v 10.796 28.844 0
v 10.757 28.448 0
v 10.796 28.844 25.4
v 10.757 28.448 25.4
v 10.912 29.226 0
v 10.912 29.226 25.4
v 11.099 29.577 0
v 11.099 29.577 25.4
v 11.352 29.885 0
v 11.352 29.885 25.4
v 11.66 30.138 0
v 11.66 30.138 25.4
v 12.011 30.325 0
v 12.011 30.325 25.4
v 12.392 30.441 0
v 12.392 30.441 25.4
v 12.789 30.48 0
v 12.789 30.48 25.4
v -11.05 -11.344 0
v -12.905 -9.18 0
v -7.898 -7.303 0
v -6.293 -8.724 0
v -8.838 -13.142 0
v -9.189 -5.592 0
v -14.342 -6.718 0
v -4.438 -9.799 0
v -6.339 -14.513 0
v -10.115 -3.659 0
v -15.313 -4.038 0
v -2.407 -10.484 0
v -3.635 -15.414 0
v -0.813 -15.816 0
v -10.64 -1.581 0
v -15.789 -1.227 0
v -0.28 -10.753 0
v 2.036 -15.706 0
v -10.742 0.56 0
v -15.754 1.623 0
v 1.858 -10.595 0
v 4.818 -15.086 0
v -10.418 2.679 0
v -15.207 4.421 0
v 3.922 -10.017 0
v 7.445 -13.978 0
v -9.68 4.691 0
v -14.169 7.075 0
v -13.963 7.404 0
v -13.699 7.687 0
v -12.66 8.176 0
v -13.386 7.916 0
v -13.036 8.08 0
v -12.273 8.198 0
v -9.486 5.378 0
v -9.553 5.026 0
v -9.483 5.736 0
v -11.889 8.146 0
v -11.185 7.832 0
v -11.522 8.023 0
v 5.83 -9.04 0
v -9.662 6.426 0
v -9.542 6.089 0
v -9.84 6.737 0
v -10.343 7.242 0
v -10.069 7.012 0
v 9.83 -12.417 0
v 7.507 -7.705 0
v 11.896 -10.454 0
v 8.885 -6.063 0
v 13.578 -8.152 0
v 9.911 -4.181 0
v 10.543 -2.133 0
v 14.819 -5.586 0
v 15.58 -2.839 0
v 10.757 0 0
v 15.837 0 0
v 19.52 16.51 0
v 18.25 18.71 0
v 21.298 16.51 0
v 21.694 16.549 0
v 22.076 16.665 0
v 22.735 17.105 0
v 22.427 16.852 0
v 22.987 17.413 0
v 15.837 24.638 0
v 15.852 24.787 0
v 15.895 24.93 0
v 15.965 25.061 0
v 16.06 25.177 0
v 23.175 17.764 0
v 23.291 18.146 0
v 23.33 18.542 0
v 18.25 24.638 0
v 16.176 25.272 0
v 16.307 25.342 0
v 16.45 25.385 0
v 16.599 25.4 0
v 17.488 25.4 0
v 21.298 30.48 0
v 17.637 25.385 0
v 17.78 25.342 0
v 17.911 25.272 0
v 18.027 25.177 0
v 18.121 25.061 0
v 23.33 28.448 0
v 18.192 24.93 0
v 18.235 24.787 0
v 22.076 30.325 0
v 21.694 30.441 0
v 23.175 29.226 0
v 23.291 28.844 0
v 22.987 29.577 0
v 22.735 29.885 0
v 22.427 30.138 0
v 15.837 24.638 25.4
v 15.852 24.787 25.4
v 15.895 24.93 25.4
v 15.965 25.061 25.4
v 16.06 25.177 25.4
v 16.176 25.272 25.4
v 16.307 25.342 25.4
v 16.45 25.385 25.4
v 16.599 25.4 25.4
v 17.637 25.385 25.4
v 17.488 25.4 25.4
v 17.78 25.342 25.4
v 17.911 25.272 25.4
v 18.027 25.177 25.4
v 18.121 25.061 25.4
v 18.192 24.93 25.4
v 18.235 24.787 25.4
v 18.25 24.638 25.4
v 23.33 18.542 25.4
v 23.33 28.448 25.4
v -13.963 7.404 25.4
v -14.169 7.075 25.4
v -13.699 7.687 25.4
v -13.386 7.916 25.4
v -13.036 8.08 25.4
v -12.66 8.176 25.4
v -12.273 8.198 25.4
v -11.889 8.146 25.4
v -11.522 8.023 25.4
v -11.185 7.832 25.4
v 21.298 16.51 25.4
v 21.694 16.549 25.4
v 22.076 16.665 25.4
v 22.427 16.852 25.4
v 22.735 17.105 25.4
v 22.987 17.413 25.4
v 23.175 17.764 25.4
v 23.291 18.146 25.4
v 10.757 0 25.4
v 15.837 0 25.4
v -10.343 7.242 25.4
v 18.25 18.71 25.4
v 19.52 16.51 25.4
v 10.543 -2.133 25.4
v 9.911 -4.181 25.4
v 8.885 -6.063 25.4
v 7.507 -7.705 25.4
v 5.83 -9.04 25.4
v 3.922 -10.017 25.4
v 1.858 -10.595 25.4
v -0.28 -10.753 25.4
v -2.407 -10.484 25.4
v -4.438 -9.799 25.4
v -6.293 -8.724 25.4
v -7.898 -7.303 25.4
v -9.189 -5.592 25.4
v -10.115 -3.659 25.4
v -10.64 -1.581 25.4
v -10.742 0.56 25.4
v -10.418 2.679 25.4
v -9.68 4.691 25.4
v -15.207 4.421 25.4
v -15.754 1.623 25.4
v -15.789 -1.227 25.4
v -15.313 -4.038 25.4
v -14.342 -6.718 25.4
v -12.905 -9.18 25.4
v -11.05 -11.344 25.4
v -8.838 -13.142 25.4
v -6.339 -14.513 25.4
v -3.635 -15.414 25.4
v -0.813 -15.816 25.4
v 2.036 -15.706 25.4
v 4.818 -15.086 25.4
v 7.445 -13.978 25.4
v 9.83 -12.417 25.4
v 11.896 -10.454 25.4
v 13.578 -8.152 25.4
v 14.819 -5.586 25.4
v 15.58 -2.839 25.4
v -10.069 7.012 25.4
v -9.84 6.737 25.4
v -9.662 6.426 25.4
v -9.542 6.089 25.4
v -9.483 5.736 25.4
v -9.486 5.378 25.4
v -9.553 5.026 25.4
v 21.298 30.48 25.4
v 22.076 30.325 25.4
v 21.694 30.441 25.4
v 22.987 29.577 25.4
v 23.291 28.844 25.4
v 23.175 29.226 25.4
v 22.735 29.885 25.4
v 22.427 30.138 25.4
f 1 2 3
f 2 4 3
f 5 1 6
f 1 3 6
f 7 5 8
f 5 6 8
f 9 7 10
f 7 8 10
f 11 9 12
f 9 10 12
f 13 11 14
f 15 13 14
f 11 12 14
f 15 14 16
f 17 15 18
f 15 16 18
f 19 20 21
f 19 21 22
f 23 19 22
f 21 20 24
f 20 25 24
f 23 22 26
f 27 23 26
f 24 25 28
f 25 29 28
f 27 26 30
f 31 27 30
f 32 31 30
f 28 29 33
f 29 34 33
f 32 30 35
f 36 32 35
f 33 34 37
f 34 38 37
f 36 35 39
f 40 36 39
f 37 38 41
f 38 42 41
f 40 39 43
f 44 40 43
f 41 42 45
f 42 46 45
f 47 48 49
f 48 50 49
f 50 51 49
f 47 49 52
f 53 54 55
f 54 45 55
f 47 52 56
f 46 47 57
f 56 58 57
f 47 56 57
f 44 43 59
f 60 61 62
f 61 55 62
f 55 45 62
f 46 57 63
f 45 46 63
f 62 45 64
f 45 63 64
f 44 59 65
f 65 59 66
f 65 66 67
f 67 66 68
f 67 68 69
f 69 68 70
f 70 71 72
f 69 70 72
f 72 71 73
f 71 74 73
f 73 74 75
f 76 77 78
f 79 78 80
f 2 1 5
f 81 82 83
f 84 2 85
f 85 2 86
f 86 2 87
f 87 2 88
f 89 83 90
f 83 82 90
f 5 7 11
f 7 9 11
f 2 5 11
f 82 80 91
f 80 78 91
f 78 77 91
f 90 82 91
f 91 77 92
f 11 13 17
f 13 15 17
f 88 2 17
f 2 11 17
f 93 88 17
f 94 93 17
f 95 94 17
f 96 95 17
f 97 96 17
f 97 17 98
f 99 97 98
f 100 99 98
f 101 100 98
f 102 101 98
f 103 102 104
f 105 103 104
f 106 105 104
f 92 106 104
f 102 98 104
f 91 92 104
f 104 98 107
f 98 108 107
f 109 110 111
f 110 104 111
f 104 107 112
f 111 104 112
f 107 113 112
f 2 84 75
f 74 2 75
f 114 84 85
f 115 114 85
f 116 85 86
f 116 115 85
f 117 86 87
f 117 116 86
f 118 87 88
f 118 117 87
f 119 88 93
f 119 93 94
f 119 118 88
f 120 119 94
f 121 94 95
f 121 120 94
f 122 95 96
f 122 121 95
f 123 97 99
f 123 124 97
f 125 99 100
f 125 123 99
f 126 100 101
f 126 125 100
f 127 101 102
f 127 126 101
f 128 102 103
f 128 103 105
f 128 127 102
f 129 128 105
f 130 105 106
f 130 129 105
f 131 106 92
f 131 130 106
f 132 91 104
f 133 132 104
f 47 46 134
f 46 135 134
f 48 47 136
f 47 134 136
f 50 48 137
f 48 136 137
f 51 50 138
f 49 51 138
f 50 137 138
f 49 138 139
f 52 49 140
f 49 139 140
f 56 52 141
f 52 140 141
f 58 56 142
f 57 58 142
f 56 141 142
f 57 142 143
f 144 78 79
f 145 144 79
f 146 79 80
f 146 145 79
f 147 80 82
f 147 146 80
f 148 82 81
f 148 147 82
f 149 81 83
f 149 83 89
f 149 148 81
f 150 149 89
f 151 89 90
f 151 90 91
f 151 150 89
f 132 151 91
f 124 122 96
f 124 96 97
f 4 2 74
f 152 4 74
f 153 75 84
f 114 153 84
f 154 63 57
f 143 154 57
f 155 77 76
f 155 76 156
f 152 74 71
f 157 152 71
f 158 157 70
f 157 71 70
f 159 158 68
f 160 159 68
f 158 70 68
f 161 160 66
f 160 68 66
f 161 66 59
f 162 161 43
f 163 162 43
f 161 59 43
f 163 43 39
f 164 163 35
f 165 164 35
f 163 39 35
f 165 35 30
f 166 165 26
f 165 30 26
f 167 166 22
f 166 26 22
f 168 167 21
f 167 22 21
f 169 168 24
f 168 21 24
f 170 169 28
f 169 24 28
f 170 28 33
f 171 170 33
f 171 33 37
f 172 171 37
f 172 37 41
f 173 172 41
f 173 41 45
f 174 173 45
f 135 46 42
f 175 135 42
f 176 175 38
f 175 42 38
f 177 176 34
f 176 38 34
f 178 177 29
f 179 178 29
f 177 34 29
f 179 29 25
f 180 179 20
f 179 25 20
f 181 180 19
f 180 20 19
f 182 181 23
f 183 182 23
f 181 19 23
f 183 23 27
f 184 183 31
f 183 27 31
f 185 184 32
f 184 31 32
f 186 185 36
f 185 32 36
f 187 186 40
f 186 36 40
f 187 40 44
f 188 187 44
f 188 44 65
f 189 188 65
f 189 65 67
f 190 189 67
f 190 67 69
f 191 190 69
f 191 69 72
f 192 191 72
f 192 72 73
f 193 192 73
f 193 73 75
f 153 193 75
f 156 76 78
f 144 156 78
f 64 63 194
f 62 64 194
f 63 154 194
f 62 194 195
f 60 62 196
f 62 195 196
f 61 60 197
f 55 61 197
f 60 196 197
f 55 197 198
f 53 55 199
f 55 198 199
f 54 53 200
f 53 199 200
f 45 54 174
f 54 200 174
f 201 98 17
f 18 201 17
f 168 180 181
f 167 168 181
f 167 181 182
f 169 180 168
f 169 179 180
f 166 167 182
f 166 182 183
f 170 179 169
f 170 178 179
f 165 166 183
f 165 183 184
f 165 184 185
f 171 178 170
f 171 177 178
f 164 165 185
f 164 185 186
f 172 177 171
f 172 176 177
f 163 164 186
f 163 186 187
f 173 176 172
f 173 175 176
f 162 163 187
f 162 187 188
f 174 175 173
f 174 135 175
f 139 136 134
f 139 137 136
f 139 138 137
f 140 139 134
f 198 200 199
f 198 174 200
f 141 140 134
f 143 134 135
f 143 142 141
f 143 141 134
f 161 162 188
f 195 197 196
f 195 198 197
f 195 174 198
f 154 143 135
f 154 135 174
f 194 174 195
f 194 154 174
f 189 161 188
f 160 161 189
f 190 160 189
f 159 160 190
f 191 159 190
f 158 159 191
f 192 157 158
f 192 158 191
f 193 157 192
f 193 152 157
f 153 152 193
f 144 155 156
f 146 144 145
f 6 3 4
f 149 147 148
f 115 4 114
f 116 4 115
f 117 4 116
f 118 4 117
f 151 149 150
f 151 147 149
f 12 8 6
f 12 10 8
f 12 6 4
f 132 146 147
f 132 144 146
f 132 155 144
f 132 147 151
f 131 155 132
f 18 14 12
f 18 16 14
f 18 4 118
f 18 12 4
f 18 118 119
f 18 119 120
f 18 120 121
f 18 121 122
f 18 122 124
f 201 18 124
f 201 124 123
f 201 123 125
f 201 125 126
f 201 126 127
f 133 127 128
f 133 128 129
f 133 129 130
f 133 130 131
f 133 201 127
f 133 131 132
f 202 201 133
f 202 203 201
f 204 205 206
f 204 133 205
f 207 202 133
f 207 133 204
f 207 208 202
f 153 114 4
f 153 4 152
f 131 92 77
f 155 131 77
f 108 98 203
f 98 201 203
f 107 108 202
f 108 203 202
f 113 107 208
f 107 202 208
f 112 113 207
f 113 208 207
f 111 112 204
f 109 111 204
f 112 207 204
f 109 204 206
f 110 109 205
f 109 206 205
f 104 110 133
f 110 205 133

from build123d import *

# Parameters (mm, degrees)
F1_DEPTH = 25.4
F2_R     = 0.762
F3_R     = 2.032
F4_SIZE2 = 2.1997045256
F4_SIZE  = 1.27


with BuildPart() as f1:
    # F0 (on Top) → F1 (new body)
    with BuildSketch(Plane.XY):
        with BuildLine():
            ThreePointArc((10.7569, 0), (-3.2346622147, -10.2590378675), (-8.8115366252, 6.1699043682))
            Line((-8.8115366252, 6.1699043682), (-12.9728290102, 9.0836726648))
            ThreePointArc((-12.9728290102, 9.0836726648), (-4.7622476762, -15.1039199773), (15.8369, 0))
            Line((15.8369, 0), (15.8369, 25.4))
            Line((15.8369, 25.4), (18.2499, 25.4))
            Line((18.2499, 25.4), (18.2499, 16.51))
            Line((18.2499, 16.51), (23.3299, 16.51))
            Line((23.3299, 16.51), (23.3299, 30.48))
            Line((23.3299, 30.48), (10.7569, 30.48))
            Line((10.7569, 30.48), (10.7569, 0))
        make_face()
    extrude(amount=F1_DEPTH)

    # F2
    f2_edges = [f1.edges().sort_by_distance(p)[0] for p in [
        (15.8369, 25.4, 12.7),
        (18.2499, 25.4, 12.7),
    ]]
    fillet(f2_edges, radius=F2_R)

    # F3
    f3_edges = [f1.edges().sort_by_distance(p)[0] for p in [
        (23.3299, 16.51, 12.7),
        (23.3299, 30.48, 12.7),
        (10.7569, 30.48, 12.7),
        (-8.811537, 6.169904, 12.7),
        (-12.972829, 9.083673, 12.7),
    ]]
    fillet(f3_edges, radius=F3_R)

    # F4
    f4_edges = [f1.edges().sort_by_distance(p)[0] for p in [
        (18.2499, 16.51, 12.7),
    ]]
    f4_side = f1.faces().sort_by_distance((19.7739, 16.51, 12.7))[0]
    chamfer(f4_edges, length=F4_SIZE, length2=F4_SIZE2, reference=f4_side)


solid = f1.part
